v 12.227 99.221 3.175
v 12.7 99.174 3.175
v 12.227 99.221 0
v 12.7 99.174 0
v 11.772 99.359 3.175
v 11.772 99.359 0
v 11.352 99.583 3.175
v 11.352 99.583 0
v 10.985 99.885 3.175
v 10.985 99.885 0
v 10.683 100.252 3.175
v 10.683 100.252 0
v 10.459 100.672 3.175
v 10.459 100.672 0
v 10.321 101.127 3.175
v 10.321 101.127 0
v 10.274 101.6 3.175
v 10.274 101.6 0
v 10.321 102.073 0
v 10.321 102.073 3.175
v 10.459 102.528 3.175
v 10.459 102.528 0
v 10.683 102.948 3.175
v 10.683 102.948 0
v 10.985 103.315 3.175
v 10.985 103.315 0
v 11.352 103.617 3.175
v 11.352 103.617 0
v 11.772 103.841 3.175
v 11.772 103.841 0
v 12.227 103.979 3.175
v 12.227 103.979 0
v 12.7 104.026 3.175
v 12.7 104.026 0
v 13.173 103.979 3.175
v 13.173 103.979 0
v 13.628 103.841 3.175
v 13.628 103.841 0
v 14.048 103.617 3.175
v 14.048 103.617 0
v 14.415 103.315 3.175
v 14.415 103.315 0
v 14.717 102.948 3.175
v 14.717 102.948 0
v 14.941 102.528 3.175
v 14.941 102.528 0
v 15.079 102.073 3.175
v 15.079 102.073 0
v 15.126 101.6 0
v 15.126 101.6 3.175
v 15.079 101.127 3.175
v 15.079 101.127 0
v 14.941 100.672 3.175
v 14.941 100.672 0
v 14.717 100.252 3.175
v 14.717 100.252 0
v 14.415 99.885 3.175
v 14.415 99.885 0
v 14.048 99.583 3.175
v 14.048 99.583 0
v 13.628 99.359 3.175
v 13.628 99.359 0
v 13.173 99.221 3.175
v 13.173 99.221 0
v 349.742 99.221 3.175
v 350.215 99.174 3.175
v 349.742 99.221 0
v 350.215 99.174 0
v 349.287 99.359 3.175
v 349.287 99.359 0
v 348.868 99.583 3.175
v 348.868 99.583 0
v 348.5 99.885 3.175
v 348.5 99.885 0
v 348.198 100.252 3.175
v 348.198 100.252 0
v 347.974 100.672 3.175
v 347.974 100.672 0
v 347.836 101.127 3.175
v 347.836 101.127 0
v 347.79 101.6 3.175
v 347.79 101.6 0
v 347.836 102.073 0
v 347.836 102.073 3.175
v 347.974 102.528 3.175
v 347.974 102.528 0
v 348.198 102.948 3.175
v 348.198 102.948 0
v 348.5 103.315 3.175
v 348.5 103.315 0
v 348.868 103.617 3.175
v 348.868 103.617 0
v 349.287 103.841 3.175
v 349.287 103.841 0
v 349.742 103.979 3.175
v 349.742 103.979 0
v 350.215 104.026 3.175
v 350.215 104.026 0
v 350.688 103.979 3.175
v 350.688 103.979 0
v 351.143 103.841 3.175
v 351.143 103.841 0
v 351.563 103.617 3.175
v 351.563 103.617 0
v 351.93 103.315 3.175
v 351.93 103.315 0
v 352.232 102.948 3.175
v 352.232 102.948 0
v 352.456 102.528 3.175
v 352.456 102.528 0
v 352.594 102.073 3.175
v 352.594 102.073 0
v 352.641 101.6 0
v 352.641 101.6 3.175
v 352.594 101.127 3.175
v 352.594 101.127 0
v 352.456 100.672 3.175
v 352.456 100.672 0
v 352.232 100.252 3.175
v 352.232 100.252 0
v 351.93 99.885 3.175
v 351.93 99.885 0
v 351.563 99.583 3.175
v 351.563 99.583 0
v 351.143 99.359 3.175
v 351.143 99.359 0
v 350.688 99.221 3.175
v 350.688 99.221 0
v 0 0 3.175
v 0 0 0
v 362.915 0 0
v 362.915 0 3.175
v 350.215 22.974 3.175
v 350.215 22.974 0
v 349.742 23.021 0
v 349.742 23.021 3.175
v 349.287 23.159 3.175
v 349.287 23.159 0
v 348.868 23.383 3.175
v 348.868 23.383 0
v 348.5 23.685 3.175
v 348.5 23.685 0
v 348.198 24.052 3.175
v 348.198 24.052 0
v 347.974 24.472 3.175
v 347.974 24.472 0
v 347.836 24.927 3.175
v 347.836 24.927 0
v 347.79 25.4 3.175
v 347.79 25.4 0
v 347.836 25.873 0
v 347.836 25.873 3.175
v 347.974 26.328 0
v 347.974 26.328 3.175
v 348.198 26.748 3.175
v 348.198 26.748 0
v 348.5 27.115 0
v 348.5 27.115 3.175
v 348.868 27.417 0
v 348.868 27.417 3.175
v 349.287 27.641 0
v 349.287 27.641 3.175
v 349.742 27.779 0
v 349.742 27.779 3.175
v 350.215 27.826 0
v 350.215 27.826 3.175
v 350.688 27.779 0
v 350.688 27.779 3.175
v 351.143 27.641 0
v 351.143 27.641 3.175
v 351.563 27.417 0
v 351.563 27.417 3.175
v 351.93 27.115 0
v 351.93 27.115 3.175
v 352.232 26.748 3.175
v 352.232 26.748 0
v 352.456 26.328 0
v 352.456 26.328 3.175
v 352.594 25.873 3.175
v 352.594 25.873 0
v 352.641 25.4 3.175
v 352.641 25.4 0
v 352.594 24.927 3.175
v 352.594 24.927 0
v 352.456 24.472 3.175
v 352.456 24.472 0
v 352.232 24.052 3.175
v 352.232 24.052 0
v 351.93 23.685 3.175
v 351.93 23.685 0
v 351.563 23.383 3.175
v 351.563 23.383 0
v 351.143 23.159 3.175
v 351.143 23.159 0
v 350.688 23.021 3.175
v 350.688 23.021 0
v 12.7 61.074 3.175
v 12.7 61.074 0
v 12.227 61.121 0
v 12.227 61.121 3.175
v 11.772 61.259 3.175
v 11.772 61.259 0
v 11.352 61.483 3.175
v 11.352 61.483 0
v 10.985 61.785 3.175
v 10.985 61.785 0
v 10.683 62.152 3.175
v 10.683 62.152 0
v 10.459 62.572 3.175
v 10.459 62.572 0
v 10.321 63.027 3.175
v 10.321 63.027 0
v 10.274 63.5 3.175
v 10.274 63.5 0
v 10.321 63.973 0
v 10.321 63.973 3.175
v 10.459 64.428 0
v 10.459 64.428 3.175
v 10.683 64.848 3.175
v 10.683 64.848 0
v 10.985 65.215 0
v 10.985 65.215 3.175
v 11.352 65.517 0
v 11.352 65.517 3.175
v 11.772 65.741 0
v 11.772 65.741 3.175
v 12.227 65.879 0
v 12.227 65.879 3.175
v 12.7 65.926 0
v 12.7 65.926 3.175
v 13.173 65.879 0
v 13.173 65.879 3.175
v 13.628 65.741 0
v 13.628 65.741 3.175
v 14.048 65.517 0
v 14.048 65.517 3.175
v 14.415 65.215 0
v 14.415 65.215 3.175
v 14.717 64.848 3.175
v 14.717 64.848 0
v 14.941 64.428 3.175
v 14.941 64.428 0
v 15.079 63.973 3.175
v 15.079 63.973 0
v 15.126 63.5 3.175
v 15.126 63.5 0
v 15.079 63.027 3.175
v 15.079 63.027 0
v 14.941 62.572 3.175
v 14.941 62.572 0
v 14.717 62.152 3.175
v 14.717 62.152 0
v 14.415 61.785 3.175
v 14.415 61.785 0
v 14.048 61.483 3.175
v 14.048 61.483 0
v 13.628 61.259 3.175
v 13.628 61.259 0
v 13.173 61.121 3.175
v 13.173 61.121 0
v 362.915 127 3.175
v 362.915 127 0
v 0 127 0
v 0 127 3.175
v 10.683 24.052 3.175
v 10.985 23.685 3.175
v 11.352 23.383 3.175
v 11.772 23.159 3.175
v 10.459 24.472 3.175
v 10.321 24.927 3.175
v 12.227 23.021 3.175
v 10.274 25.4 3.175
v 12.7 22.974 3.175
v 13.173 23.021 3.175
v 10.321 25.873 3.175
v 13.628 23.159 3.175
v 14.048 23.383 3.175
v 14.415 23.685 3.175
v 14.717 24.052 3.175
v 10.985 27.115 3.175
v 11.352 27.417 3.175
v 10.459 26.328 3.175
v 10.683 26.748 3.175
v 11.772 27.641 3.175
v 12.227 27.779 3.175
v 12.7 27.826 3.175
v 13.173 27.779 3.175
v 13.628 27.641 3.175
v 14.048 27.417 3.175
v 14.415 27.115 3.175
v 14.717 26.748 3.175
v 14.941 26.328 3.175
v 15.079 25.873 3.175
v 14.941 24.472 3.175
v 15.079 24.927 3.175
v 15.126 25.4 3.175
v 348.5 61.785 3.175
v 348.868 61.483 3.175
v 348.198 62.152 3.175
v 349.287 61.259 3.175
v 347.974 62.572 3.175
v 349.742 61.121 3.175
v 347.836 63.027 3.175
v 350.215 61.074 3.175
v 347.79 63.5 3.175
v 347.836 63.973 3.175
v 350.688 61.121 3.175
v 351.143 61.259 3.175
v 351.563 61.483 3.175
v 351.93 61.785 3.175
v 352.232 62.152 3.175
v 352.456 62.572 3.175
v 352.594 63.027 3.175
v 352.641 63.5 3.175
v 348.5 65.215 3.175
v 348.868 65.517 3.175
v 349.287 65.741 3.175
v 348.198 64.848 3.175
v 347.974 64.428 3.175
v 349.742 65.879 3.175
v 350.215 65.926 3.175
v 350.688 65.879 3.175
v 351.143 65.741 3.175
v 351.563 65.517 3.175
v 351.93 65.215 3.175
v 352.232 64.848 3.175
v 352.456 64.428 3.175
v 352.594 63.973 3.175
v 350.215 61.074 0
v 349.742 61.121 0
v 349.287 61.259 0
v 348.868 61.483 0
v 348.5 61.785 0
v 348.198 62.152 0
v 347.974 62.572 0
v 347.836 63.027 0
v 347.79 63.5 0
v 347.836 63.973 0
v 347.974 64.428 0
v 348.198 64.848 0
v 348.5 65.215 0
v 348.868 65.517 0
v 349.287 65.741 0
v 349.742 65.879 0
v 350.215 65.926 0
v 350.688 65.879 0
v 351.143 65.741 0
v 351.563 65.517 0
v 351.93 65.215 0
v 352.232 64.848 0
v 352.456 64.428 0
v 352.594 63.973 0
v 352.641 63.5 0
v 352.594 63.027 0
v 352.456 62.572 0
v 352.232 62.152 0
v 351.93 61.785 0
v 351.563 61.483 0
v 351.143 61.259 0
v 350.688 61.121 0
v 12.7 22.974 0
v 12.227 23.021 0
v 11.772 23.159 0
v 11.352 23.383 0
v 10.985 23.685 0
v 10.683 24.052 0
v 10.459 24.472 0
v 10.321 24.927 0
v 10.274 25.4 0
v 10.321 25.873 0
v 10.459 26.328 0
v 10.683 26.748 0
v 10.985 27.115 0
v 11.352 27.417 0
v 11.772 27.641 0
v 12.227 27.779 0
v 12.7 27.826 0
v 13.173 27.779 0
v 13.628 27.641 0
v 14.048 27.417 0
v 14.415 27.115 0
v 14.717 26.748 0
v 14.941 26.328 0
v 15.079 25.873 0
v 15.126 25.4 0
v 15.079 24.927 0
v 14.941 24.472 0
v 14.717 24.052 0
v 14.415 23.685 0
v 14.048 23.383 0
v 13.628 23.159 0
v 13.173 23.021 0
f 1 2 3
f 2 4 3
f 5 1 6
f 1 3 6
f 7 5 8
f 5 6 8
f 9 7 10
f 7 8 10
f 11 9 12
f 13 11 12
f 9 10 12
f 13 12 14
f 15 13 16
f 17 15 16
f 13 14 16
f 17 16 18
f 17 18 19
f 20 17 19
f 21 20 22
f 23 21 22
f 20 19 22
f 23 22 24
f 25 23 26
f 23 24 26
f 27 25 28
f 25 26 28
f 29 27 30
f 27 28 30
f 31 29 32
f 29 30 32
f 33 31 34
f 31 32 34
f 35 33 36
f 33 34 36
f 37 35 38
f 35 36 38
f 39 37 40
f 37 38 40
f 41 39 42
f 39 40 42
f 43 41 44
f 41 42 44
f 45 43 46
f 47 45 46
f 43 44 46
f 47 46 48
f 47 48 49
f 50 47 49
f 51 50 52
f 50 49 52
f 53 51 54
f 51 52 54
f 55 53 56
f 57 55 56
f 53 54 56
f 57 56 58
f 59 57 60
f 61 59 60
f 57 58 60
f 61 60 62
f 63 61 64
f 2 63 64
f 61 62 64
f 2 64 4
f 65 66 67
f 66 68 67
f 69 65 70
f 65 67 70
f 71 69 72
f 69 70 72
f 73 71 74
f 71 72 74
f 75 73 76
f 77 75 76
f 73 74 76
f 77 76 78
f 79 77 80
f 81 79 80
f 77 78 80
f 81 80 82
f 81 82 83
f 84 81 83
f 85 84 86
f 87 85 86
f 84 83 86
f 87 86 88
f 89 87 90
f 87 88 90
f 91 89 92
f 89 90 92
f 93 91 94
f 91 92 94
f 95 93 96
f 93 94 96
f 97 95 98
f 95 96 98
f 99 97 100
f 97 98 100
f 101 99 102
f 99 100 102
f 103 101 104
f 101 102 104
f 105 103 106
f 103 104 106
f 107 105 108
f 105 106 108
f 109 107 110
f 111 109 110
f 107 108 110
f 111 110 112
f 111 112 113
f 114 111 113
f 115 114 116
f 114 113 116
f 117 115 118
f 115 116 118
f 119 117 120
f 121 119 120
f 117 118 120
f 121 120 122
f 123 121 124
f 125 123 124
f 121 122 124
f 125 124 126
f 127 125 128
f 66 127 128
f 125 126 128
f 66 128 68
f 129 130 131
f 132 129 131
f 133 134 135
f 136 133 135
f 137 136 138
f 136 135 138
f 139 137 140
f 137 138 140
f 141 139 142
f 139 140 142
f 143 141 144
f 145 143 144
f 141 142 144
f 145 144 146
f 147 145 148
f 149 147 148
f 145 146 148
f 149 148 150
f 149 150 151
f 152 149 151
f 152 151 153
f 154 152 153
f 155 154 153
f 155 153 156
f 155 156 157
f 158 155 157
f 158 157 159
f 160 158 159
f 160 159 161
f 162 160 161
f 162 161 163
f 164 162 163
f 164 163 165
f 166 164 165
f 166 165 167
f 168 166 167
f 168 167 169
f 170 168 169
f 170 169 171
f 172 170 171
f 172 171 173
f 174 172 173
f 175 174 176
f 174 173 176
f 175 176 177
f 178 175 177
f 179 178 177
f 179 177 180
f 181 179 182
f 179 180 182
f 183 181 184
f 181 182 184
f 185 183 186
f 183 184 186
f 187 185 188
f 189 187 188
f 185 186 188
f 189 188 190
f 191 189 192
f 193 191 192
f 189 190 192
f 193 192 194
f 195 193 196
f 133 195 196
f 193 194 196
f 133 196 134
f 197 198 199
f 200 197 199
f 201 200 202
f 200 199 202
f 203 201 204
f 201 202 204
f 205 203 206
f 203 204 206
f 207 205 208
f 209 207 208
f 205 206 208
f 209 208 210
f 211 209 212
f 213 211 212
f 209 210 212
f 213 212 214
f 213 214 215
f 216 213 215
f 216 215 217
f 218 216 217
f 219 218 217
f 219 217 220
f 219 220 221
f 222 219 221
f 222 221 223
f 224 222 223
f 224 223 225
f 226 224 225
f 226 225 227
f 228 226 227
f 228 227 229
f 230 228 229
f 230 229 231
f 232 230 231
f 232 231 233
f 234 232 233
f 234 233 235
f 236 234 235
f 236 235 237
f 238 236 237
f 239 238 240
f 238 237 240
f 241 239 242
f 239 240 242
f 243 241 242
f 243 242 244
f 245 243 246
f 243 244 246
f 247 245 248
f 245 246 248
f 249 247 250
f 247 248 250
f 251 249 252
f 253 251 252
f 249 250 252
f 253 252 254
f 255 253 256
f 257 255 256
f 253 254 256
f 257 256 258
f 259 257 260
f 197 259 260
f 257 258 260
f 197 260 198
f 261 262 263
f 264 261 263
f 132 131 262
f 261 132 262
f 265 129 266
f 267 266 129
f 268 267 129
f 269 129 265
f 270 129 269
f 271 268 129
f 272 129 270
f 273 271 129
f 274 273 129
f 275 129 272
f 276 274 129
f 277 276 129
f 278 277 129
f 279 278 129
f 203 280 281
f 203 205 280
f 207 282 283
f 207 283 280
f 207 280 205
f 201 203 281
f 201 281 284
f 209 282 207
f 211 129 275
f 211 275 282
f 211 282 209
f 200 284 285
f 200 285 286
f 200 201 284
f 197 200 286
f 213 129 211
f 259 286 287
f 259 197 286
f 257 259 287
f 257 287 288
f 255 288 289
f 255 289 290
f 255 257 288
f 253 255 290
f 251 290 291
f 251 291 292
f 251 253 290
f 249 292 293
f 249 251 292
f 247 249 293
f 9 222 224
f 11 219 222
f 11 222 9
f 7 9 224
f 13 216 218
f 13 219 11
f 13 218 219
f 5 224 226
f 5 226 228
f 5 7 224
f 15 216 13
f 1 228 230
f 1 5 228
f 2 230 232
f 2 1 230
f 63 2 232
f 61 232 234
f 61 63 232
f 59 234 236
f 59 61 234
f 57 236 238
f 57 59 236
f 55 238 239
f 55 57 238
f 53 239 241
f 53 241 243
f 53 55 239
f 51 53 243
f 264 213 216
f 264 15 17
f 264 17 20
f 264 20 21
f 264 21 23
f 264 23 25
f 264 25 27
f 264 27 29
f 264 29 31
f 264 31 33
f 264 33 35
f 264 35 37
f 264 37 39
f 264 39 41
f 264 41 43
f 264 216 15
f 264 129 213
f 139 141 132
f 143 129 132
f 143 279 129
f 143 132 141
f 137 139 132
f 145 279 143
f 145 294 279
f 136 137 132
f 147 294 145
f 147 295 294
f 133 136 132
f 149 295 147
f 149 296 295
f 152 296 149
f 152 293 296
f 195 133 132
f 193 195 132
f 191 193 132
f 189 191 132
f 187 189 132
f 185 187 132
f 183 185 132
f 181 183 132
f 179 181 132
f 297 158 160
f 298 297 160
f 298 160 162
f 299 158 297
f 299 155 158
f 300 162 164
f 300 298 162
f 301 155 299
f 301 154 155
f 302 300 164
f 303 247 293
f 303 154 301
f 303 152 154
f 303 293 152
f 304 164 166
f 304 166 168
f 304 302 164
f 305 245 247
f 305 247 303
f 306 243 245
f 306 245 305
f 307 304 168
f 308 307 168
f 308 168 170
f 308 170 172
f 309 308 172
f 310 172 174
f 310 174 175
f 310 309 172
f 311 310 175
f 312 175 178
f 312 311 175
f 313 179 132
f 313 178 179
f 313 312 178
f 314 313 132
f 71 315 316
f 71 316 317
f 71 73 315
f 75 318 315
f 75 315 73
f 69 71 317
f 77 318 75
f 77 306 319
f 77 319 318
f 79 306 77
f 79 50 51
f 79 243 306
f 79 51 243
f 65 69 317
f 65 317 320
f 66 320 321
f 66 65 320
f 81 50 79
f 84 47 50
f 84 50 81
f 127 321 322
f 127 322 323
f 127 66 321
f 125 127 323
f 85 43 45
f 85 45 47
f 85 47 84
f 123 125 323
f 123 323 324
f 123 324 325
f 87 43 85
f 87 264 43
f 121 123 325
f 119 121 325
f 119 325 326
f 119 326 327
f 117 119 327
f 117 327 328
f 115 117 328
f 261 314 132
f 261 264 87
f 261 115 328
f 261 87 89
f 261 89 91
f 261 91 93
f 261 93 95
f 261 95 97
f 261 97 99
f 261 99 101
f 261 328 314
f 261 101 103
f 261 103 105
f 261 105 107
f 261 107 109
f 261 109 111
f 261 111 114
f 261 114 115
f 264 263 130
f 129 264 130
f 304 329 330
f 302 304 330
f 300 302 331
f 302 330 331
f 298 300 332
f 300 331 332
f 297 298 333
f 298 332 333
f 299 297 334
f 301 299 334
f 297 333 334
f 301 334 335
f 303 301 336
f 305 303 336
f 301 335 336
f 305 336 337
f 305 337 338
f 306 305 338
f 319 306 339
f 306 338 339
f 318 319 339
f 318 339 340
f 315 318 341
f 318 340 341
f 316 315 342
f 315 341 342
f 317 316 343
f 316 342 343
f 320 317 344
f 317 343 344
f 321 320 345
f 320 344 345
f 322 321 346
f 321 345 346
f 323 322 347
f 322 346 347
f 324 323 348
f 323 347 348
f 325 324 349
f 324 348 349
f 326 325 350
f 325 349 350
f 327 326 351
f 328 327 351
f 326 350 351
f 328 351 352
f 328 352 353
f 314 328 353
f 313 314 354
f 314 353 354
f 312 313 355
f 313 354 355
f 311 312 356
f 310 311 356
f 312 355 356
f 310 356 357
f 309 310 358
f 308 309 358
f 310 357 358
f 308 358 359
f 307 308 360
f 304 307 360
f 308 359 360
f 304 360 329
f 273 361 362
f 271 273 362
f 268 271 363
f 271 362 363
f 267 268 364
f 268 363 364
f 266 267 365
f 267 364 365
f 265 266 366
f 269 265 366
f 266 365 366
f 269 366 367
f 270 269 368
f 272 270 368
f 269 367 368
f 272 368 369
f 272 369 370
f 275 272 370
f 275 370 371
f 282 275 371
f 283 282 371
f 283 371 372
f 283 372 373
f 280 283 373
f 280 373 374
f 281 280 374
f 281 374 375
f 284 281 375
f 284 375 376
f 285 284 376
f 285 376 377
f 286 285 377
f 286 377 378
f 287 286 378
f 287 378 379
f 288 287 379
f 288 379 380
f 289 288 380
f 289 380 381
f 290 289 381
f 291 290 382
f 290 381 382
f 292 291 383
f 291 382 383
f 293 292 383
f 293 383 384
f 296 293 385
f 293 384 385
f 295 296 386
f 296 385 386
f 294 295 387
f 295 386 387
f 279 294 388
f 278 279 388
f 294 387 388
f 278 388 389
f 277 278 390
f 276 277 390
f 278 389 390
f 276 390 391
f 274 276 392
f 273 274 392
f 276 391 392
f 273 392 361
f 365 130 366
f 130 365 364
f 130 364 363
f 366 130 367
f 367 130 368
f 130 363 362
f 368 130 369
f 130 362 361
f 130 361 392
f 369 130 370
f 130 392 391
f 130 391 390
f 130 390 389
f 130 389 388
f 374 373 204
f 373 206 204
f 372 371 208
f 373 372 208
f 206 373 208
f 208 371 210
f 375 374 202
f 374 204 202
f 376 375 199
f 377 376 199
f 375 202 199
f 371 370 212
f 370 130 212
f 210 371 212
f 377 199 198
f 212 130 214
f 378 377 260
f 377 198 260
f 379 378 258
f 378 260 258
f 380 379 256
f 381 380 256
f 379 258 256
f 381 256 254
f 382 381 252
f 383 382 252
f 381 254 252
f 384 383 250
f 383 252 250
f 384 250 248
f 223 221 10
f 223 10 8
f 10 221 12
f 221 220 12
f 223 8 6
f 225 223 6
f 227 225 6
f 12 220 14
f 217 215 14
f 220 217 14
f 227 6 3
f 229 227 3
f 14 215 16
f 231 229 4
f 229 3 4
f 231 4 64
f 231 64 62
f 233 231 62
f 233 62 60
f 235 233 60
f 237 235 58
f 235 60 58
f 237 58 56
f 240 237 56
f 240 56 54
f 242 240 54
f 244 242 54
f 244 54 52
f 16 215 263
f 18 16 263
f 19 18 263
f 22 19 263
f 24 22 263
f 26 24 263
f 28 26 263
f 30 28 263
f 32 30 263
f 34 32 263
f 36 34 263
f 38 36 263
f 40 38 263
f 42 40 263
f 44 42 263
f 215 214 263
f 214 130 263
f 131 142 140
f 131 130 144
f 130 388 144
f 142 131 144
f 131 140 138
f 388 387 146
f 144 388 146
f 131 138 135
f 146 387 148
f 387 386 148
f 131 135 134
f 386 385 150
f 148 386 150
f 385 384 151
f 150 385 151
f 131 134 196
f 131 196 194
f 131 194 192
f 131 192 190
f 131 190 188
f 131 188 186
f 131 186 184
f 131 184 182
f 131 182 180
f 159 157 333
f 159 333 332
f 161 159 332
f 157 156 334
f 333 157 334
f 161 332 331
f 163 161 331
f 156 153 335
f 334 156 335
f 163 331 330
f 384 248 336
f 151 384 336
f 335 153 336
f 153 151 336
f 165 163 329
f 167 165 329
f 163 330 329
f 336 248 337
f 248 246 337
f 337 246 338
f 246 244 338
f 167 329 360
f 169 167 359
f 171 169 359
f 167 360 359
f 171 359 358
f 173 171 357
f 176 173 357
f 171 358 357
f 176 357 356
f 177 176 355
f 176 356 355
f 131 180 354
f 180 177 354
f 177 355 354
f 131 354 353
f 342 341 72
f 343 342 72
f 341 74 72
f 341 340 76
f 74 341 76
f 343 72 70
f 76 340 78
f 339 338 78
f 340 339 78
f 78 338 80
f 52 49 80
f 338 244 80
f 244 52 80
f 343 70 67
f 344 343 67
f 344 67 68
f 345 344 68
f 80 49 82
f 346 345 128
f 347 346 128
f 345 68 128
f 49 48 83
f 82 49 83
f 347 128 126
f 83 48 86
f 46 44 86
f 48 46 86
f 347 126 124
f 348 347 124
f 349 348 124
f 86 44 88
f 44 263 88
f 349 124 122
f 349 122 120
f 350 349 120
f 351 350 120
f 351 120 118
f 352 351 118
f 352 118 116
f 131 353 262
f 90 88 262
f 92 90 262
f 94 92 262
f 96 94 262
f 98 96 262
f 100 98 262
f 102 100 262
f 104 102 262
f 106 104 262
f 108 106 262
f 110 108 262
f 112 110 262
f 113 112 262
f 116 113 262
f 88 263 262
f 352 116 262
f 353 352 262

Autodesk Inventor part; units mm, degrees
ref_plane "YZ Plane" through (0, 0, 0) normal (1, 0, 0) x (0, 1, 0)
ref_plane "XZ Plane" through (0, 0, 0) normal (0, 1, 0) x (-1, 0, 0)
ref_plane "XY Plane" through (0, 0, 0) normal (0, 0, 1) x (1, 0, 0)
sketch "Sketch1" plane through (0, 0, 0) normal (0, 0, 1) x (1, 0, 0)
  line L0 (0, 0) -> (362.9152, 0)
  line L1 (362.9152, 0) -> (362.9152, 127)
  line L2 (362.9152, 127) -> (0, 127)
  line L3 (0, 127) -> (0, 0)
  dimension "d0" = 362.9152
  dimension "d1" = 127
extrude "Extrusion1" add sketch "Sketch1" along normal blind 3.175
sketch "Sketch2" plane through (0, 0, 3.175) normal (0, 0, 1) x (1, 0, 0)
  line L0 (0, 127) -> (0, 0) projected
  line L1 (362.9152, 0) -> (362.9152, 127) projected
  line L2 (362.9152, 127) -> (0, 127) projected
  line L3 (0, 0) -> (362.9152, 0) projected
  point P0 (12.7, 25.4)
  point P1 (12.7, 63.5)
  point P2 (350.2152, 25.4)
  point P3 (350.2152, 63.5)
  point P4 (12.7, 101.6)
  point P5 (350.2152, 101.6)
  dimension "d4" = 12.7
  dimension "d5" = 12.7
  dimension "d6" = 12.7
  dimension "d7" = 12.7
  dimension "d8" = 12.7
  dimension "d9" = 12.7
  dimension "d10" = 25.4
  dimension "d11" = 25.4
  dimension "d12" = 38.1
hole "Hole1" at (12.7, 25.4, 3.175) at (12.7, 63.5, 3.175) at (350.2152, 25.4, 3.175) at (350.2152, 63.5, 3.175) at (12.7, 101.6, 3.175) at (350.2152, 101.6, 3.175) direction (0, 0, -1) diameter 4.8514 end through all
properties part number "ARM_076_LexanShield"
